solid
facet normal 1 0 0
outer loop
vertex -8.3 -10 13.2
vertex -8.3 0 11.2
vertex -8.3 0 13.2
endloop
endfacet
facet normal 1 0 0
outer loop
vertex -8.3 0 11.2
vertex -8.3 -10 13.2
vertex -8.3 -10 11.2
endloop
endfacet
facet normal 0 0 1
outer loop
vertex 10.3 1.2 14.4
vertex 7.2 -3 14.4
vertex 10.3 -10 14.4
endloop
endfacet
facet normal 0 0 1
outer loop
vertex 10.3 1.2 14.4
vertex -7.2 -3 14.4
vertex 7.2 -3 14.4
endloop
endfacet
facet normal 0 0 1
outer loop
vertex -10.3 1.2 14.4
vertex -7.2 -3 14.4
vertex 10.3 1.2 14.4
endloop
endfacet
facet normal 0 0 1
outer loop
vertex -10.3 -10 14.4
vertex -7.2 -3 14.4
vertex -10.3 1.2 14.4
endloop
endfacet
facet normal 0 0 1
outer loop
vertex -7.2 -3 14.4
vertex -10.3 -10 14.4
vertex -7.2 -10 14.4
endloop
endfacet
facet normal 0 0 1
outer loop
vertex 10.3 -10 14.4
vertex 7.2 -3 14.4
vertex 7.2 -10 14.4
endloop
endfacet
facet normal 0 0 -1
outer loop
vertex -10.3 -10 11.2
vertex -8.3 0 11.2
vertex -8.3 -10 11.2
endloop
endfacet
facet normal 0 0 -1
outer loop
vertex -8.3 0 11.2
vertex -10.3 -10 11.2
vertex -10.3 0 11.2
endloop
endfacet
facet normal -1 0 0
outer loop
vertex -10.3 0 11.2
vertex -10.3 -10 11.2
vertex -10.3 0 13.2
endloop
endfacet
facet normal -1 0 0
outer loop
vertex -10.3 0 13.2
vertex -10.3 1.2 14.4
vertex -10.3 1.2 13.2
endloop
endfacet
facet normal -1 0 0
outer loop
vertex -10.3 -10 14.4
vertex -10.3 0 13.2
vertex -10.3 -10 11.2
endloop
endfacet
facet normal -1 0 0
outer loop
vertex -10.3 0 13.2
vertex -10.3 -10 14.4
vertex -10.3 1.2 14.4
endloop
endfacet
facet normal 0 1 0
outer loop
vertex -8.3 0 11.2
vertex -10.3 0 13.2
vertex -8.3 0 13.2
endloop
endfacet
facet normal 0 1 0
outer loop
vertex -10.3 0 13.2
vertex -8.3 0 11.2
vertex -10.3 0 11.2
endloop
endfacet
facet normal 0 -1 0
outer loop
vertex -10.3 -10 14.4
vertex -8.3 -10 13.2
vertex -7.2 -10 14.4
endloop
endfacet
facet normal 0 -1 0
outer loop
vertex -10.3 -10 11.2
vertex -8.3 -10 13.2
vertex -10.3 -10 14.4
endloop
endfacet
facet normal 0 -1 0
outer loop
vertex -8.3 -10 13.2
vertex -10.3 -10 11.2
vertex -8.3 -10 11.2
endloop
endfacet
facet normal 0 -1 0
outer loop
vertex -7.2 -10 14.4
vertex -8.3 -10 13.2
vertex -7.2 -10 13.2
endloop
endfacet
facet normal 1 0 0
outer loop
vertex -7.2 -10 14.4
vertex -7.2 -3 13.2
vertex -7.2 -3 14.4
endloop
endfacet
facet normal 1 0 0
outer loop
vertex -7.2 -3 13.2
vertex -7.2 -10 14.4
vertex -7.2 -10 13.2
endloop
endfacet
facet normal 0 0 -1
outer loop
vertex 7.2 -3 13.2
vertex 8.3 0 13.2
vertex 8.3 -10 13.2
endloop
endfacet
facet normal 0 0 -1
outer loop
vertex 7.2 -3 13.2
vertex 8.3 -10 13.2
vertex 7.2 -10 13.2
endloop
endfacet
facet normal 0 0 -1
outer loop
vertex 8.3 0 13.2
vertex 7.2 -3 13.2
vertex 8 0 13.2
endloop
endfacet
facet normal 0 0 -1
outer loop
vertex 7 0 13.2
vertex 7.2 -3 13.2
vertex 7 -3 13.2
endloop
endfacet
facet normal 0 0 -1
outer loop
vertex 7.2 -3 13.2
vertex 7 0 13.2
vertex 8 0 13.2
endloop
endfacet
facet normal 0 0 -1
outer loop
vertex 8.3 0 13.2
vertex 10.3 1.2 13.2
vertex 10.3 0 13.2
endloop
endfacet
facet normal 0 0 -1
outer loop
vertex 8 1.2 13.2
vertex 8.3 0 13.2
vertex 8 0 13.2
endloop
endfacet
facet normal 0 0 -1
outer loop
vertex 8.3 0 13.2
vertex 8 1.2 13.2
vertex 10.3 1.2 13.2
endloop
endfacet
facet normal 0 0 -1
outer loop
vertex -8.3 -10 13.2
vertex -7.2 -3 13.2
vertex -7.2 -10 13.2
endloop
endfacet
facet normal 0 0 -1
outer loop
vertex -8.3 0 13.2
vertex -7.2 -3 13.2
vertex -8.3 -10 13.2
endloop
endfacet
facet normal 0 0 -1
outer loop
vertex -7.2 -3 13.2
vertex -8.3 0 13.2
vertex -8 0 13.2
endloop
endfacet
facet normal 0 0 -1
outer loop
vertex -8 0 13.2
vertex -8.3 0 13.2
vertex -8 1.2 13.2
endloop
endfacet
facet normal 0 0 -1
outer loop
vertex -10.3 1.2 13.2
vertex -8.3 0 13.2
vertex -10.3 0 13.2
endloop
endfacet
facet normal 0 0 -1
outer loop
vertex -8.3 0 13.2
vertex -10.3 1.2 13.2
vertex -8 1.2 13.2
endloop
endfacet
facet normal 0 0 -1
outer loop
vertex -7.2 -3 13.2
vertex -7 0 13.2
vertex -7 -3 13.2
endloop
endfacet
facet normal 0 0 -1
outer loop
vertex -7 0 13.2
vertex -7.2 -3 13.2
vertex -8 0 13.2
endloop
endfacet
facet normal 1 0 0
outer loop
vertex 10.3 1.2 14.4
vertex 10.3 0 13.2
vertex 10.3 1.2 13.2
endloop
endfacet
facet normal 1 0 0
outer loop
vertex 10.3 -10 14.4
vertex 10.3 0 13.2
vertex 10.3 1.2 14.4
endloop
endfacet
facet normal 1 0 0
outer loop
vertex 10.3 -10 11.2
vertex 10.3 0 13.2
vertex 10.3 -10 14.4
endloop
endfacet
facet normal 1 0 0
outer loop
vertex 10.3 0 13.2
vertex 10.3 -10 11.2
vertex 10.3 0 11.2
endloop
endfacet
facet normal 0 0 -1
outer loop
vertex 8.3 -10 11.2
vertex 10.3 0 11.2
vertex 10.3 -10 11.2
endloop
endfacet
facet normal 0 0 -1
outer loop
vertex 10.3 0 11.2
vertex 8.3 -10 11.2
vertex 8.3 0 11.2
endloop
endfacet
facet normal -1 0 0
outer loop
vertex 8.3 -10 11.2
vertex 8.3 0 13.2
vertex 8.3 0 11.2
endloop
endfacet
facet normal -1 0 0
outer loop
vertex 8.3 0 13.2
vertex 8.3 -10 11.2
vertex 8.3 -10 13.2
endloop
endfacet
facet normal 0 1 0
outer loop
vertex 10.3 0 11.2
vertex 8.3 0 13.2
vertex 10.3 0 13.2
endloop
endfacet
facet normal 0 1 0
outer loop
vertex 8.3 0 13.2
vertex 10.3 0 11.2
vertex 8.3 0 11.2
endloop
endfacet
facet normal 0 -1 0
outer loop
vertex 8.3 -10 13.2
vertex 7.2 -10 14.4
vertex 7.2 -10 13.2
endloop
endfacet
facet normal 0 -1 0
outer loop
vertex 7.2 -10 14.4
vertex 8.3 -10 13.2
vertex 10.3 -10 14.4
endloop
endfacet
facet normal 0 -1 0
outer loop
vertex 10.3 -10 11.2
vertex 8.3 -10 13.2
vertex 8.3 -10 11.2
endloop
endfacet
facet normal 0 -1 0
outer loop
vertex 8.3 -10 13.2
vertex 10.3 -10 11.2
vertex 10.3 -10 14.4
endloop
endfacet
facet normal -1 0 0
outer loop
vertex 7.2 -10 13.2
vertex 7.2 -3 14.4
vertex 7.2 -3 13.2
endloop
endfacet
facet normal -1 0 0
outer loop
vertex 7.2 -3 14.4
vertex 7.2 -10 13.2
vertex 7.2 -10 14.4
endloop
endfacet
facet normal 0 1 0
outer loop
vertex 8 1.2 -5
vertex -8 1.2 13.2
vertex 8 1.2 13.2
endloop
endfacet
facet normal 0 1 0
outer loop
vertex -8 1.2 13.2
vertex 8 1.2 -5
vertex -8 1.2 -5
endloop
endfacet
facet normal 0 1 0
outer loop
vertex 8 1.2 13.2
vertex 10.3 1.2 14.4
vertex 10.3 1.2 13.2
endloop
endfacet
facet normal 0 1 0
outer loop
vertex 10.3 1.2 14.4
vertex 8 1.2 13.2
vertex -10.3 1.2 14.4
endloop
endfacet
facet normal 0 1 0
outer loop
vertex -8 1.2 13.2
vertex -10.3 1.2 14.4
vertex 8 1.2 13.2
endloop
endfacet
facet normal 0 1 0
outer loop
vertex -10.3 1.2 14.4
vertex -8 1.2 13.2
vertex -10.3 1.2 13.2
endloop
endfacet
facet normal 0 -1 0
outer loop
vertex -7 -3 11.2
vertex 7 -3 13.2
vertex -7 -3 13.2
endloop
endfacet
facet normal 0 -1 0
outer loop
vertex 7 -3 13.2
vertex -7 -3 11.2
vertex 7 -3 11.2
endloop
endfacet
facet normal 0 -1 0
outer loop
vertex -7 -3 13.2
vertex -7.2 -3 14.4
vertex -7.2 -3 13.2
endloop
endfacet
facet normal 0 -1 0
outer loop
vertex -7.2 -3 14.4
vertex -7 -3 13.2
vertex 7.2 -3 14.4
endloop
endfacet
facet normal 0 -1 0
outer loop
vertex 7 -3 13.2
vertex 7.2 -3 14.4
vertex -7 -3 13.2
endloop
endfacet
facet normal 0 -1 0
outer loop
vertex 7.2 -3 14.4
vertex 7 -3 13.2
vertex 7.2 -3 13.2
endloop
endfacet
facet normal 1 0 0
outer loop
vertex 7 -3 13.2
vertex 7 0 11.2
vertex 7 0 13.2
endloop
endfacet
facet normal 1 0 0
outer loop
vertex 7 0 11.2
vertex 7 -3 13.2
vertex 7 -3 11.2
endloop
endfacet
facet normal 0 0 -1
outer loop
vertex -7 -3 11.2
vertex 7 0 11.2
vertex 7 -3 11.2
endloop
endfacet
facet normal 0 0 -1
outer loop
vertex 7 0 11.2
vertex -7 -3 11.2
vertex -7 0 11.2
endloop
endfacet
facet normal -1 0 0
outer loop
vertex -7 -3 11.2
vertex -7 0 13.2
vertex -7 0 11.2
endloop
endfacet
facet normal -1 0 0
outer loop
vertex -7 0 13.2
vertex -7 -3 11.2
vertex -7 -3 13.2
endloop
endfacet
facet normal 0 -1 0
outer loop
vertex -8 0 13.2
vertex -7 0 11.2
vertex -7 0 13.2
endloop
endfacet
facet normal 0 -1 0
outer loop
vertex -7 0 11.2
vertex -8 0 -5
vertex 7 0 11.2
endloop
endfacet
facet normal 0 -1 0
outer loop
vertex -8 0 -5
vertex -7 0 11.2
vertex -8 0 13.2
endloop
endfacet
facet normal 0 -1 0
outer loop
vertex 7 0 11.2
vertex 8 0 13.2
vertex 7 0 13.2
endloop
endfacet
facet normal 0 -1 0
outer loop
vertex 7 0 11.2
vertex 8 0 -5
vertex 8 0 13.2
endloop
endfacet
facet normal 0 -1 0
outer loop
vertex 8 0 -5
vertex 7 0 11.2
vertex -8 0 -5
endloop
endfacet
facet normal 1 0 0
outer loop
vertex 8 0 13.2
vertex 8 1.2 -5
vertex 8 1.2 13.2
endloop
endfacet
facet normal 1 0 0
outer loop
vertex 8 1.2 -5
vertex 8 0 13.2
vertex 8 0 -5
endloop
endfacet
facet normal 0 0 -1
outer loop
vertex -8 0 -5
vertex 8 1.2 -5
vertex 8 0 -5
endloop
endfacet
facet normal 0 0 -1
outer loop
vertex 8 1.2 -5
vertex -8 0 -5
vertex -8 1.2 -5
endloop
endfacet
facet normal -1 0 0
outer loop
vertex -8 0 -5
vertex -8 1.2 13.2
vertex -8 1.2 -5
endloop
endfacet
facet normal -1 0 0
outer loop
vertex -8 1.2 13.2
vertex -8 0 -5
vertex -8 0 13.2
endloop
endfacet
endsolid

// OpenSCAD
// ReachSense six-finger wrap v2. Units: mm. Experimental, physically unverified.
// R: +X lateral, +Y distal (towards fingertip), +Z dorsal.
// A REMOVABLE seating gauge defines Y=0. The wearable deck ends at Y=-3.
// Remove the gauge before testing; no permanent wall blocks the fingertip.
// This defines nominal longitudinal registration, NOT an anatomical 3D point.
$fn = 48;
part = "gauge"; // "holder", "gauge" or "strap"
marker_id = 31;
finger_diameter_mm = 20;
marker_edge_mm = 10;
quiet_zone_mm = 2;
frame_mm = 1;
wall_mm = 2;
stop_wall_mm = 1.2;
strap_width_mm = 6;
strap_length_mm = 90;
gauge_side_clearance_mm = 0.3;
r = finger_diameter_mm/2;
tile = marker_edge_mm + 2*quiet_zone_mm;
deck_width = tile + 2*frame_mm;
length = tile + 2*frame_mm + 8;
deck_front_y = -3;
deck_back_y = deck_front_y-length;
deck_bottom = r + wall_mm - 0.8;
deck_top = deck_bottom + 2;
pocket_depth = 0.2;
marker_y = deck_front_y-(frame_mm+quiet_zone_mm+marker_edge_mm/2);
support_y = [deck_front_y-5,deck_back_y+5];
nail_seat_width = min(8,finger_diameter_mm/2);
nail_seat_z = r-0.6;
assert(finger_diameter_mm >= 12 && finger_diameter_mm <= 26,"Choose a 12–26 mm candidate opening");
assert(marker_edge_mm >= 8 && marker_edge_mm <= 16,"Choose an 8–16 mm black edge");
assert(quiet_zone_mm >= 2,"Keep the full white quiet zone");
assert(marker_id >= 0 && marker_id < 100,"DICT_4X4_100 ID required");
module support(y) {
    translate([0,y,0]) intersection() {
        difference() {
            rotate([90,0,0]) cylinder(r=r+wall_mm,h=6.8,center=true);
            rotate([90,0,0]) cylinder(r=r,h=8.8,center=true);
        }
        translate([-r-wall_mm-1,-4.4,0]) cube([2*(r+wall_mm+1),8.8,r+wall_mm+1]);
    }
    // Flat dorsal bearing at each strap region closes the gap below the deck.
    // Contact with a real nail/dorsal surface and rotational retention are unverified.
    translate([-nail_seat_width/2,y-1.5,nail_seat_z])
        cube([nail_seat_width,3,deck_bottom-nail_seat_z+0.2]);
    for(sign=[-1,1]) translate([sign*(r+wall_mm+2.1),y,1.5]) difference() {
        cube([6,8.8,3],center=true);
        cube([2.6,6.4,5],center=true);
    }
}
module deck() {
    // Rounded corners retain a straight central gauge abutment at Y=-3.
    hull() for(x=[-deck_width/2+1,deck_width/2-1])
        for(y=[deck_back_y+1,deck_front_y-1])
            translate([x,y,deck_bottom]) cylinder(r=1,h=2);
}
module holder() {
    difference() {
        union() { for(y=support_y) support(y); deck(); }
        translate([-tile/2-0.1,marker_y-tile/2-0.1,deck_top-pocket_depth])
            cube([tile+0.2,tile+0.2,pocket_depth+1]);
    }
}
module gauge() {
    // Hand-held drop-on gauge, NOT a validated snap fit. Hold its proximal
    // abutment against the deck's front face at Y=-3 while gently seating the finger.
    // Feet sit on the bare side frame; the ArUco pocket remains clear.
    union() {
        translate([-deck_width/2-2.3,deck_front_y,deck_top])
            cube([deck_width+4.6,-deck_front_y+stop_wall_mm,1.2]);
        // Deck contact Y=-3; fingertip contact Y=0. Remove upwards after tightening.
        translate([-deck_width/2+1,deck_front_y,deck_bottom])
            cube([deck_width-2,-deck_front_y,deck_top-deck_bottom+0.5]);
        translate([-deck_width/2,0,-r/2])
            cube([deck_width,stop_wall_mm,deck_top+1.2+r/2]);
        for(sign=[-1,1]) {
            x=sign>0 ? deck_width/2+gauge_side_clearance_mm : -deck_width/2-gauge_side_clearance_mm-2;
            translate([x,-10,deck_bottom]) cube([2,10,deck_top-deck_bottom+1.2]);
            foot_x=sign>0 ? deck_width/2-0.8 : -deck_width/2-2.3;
            translate([foot_x,-10,deck_top]) cube([3.1,10,1.2]);
        }
    }
}
module strap() {
    // TPU-only ladder strip. Ends require a return loop/fastener or hook-and-loop.
    union() {
        translate([-strap_length_mm/2,-strap_width_mm/2,0]) cube([strap_length_mm,strap_width_mm,0.8]);
        for(x=[-strap_length_mm/2+3:4:strap_length_mm/2-3])
            translate([x-0.7,-strap_width_mm/2,0.8]) cube([1.4,strap_width_mm,0.5]);
    }
}
if(part=="strap") strap(); else if(part=="gauge") gauge(); else holder();
echo(reference_plane_y_mm=0,deck_front_y_mm=deck_front_y);
echo(marker_center_R_mm=[0,marker_y,deck_top-pocket_depth+0.15]);
echo(marker_center_to_reference_plane_mm=-marker_y);
